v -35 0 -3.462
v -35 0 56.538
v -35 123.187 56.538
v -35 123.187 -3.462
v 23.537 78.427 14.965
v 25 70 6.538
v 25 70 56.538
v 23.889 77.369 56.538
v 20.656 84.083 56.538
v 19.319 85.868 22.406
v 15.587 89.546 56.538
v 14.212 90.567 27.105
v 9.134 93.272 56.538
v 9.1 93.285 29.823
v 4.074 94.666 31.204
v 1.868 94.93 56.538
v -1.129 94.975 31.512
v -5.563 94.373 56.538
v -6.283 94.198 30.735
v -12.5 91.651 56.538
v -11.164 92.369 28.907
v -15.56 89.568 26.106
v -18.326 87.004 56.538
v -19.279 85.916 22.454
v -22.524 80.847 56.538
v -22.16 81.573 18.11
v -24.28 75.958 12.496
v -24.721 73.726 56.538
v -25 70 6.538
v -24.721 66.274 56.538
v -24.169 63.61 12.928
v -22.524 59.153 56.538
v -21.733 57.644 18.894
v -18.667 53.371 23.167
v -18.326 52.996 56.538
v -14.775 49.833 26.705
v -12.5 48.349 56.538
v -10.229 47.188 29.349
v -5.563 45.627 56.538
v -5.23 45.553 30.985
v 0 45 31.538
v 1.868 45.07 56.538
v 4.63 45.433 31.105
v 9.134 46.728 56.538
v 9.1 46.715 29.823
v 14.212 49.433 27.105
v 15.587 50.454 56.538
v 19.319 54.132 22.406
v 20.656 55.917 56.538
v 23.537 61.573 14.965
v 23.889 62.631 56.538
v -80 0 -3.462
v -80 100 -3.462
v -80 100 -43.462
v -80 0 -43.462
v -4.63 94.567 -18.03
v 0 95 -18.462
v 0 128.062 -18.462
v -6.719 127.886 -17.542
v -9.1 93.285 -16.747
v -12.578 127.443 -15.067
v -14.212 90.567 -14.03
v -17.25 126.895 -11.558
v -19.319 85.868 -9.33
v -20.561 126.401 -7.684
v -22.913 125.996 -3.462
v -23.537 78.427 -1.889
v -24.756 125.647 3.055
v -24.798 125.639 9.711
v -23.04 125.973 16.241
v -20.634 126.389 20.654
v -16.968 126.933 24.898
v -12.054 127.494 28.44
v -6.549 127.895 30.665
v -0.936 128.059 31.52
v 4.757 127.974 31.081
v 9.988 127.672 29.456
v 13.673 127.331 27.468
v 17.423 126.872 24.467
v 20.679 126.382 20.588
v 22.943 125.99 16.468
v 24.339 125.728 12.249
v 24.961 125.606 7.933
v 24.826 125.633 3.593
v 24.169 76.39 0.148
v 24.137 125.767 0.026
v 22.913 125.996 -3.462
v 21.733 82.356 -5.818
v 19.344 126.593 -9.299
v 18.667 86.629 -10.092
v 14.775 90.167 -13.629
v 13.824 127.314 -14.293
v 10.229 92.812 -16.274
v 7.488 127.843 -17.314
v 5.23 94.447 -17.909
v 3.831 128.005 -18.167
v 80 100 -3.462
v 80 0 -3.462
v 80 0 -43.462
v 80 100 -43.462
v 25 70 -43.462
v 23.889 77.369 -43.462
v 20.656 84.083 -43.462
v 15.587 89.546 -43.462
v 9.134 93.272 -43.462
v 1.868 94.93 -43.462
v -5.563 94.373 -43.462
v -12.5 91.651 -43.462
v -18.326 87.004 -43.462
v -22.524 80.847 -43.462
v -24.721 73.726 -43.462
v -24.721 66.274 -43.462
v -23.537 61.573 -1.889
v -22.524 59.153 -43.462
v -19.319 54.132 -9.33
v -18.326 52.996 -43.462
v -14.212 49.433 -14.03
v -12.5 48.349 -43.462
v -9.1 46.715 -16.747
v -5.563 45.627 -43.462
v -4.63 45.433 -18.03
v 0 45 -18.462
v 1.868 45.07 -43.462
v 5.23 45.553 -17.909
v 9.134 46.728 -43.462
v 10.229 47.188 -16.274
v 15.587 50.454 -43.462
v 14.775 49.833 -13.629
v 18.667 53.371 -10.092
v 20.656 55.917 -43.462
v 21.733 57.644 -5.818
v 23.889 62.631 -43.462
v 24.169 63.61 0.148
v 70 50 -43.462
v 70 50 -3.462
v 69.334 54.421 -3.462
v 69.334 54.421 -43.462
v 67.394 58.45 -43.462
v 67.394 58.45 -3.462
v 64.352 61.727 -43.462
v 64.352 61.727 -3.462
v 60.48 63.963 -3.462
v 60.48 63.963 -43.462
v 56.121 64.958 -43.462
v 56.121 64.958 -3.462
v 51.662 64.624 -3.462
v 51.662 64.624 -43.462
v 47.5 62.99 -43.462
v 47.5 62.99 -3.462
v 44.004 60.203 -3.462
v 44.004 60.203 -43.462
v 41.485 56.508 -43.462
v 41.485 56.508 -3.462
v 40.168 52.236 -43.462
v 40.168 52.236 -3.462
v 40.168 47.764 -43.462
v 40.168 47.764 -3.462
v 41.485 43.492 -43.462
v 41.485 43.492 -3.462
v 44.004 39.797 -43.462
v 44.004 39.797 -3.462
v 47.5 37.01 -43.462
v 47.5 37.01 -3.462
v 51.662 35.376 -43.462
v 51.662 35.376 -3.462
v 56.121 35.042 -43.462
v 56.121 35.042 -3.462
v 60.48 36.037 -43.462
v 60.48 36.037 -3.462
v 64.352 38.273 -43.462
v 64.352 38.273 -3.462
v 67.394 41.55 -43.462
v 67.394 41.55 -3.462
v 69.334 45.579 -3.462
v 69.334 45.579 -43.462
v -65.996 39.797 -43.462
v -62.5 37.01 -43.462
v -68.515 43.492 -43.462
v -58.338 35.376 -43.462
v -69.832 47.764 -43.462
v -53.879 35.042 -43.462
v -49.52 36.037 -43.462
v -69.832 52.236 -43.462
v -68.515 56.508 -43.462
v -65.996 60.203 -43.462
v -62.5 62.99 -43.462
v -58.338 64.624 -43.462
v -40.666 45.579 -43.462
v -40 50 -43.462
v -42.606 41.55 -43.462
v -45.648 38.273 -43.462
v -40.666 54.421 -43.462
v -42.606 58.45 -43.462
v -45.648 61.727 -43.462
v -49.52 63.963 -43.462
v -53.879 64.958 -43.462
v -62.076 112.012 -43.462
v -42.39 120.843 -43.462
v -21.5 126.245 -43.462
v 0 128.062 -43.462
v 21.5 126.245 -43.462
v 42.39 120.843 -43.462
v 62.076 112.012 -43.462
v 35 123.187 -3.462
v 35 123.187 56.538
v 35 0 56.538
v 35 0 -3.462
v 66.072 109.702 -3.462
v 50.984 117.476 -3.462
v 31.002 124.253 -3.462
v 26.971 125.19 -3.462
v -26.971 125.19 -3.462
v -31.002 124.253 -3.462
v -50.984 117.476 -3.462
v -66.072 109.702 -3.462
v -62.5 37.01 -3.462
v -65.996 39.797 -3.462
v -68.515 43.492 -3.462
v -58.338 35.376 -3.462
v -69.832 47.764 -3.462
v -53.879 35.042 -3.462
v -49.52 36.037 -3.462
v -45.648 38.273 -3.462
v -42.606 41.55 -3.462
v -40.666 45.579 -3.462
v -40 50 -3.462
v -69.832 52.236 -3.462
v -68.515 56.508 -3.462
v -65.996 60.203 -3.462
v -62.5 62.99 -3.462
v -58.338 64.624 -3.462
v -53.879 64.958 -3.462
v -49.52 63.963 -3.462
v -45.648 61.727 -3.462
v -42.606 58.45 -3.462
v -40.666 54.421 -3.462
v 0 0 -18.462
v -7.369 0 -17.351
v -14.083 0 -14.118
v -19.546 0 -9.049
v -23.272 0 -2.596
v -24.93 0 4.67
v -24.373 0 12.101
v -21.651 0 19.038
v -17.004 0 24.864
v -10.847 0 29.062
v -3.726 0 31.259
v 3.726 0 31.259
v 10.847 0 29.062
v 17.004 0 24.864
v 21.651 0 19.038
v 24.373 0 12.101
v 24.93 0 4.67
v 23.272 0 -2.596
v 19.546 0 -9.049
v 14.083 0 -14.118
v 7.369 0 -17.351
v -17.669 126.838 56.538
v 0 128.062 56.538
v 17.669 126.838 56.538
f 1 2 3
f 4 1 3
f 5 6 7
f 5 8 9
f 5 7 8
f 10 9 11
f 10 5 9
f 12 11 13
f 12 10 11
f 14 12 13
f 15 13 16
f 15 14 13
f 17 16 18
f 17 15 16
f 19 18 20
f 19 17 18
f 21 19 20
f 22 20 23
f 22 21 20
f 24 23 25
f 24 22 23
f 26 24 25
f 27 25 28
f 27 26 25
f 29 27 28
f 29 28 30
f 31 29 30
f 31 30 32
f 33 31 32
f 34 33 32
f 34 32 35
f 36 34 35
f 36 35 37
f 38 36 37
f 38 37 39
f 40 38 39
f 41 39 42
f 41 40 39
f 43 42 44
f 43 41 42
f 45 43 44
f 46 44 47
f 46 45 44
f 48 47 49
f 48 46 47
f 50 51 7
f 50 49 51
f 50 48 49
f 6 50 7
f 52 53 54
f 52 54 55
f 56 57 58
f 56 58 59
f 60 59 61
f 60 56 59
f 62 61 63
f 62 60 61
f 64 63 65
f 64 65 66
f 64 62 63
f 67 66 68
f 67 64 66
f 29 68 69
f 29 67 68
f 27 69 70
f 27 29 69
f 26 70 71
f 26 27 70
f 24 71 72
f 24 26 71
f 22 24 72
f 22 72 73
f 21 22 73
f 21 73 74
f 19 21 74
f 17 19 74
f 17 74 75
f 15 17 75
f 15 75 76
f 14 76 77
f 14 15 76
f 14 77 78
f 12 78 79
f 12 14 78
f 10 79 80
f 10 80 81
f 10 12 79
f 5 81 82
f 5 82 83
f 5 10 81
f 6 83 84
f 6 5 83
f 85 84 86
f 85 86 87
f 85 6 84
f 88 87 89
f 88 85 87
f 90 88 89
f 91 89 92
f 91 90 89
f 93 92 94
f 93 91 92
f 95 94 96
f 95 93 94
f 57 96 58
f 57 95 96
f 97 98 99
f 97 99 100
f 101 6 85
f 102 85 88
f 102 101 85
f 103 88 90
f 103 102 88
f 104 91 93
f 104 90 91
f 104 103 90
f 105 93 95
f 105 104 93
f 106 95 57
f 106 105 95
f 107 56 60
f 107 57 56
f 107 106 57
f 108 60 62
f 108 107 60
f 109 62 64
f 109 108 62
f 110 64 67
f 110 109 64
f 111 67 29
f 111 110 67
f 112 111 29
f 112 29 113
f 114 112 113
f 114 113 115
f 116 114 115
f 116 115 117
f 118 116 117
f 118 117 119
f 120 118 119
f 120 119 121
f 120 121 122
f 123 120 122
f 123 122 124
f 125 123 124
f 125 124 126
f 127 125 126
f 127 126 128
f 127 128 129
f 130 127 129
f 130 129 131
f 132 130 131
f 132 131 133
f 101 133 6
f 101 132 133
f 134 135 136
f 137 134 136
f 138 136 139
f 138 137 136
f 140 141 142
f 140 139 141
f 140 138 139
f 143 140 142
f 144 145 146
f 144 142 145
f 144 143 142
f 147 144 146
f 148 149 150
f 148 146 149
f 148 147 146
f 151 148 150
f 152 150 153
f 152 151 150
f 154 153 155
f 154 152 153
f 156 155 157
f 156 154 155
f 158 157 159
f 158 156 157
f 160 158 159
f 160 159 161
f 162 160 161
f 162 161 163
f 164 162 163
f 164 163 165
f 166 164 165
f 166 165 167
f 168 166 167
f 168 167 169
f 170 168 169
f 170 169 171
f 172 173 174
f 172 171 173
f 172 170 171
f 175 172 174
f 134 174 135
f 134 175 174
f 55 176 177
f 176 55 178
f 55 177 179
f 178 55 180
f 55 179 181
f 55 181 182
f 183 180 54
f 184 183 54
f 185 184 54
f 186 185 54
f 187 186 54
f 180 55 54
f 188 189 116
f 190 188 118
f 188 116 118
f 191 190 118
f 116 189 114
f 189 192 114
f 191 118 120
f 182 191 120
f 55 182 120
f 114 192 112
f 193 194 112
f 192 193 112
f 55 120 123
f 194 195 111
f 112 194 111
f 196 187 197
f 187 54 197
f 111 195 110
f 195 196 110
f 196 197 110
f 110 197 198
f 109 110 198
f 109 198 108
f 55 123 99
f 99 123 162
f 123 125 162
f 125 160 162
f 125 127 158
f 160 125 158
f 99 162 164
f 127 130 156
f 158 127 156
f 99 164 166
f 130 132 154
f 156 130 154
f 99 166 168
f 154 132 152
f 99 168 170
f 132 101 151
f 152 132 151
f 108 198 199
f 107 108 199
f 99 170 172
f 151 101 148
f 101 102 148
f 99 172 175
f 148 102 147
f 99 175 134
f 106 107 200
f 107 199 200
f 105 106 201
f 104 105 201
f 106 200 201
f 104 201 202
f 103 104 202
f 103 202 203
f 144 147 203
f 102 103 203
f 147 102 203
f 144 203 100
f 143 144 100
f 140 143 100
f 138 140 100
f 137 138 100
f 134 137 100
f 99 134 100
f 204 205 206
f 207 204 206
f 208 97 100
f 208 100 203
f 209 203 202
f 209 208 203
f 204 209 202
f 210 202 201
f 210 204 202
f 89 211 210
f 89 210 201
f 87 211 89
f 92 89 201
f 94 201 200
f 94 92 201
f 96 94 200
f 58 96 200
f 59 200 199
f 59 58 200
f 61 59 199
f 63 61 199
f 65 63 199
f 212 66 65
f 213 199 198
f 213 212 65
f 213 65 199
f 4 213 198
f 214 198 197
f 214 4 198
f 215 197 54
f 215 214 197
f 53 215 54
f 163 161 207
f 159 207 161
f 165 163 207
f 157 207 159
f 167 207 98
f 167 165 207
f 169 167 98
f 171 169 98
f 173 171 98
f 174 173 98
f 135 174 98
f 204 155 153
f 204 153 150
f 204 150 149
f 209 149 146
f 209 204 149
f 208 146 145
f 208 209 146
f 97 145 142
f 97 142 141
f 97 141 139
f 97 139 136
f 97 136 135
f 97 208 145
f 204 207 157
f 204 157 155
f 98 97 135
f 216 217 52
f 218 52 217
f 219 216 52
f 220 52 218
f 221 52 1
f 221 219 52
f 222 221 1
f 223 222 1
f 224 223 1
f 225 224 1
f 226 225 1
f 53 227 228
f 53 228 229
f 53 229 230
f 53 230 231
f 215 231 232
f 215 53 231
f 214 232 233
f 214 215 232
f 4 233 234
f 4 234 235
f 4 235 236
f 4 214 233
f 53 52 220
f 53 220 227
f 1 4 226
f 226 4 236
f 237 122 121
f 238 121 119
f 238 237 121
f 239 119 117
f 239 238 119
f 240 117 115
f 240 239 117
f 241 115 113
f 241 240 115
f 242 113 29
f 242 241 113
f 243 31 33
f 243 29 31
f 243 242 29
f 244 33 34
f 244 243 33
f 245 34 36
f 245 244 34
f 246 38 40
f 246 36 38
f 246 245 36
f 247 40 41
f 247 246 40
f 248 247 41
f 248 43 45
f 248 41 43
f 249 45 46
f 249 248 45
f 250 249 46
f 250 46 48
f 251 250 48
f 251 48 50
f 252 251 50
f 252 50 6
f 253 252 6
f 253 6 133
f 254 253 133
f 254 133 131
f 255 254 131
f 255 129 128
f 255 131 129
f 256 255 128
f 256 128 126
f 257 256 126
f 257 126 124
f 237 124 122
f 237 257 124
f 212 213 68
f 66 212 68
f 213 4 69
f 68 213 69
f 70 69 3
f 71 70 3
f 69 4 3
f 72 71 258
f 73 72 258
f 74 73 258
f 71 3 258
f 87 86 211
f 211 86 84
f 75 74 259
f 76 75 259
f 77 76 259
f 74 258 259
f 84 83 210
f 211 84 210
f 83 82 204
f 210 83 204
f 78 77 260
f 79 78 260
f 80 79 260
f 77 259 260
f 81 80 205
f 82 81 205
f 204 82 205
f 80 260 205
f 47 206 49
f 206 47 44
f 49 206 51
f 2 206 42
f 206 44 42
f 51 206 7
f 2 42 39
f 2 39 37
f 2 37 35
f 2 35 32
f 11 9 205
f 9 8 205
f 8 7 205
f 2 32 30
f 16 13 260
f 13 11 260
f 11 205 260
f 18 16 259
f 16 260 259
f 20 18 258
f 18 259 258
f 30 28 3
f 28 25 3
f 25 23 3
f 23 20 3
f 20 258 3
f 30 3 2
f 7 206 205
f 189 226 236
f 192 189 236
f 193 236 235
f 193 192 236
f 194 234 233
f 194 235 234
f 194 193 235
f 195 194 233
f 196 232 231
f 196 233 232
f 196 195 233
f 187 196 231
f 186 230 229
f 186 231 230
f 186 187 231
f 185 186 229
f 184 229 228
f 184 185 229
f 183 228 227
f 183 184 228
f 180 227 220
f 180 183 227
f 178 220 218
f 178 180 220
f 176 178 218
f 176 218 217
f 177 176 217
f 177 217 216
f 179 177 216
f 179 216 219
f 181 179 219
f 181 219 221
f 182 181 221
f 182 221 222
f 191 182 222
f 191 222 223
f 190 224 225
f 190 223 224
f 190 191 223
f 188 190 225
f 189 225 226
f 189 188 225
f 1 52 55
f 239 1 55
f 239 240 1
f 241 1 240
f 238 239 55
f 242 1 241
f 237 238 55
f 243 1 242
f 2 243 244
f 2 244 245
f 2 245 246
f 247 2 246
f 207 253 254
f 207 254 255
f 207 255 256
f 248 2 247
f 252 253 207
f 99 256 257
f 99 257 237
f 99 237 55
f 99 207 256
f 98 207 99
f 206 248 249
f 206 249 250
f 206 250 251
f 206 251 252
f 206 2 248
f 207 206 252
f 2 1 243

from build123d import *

# Parameters (mm, degrees)
EXTRUDE_START            = -3.462177
EXTRUDE_1_DEPTH          = 40
EXTRUDE_START_2          = 60
EXTRUDE_2_DEPTH          = 60
CUT_EXTRUDE_1_REACH      = 163.234
CUT_EXTRUDE_1_END_RADIUS = 128.062484749
SKETCH_1_R               = 25
CUT_EXTRUDE_2_DEPTH      = 163.48076826
CUT_EXTRUDE_2_DEPTH_BACK = 163.48076826
SKETCH_5_R               = 25
SKETCH_5_R_2             = 15


with BuildPart() as part:
    # 草图2 → 凸台-拉伸1 (new body)
    with BuildSketch(Plane.XY.offset(EXTRUDE_START)):
        with BuildLine():
            Line((-80, 0), (80, 0))
            Line((80, 0), (80, 100))
            ThreePointArc((80, 100), (0, 128.062484749), (-80, 100))
            Line((-80, 100), (-80, 0))
        make_face()
    extrude(amount=-EXTRUDE_1_DEPTH)

    # 草图4 → 凸台-拉伸2 (add)
    with BuildSketch(Plane.XY.offset(-3.46217708).offset(EXTRUDE_START_2)):
        with BuildLine():
            Line((-35, 0), (-35, 123.186849948))
            ThreePointArc((-35, 123.186849948), (0, 128.062484749), (35, 123.186849948))
            Line((35, 123.186849948), (35, 0))
            Line((35, 0), (-35, 0))
        make_face()
    extrude(amount=-EXTRUDE_2_DEPTH)

    # 切除-拉伸1: up to this cylinder (the profile starts inside it)
    cut_extrude_1_end = Plane(origin=(0, 0, 6.537823), z_dir=(0, 0, 1)) * Cylinder(CUT_EXTRUDE_1_END_RADIUS, 583.592969497, mode=Mode.PRIVATE)
    # 草图1 → 切除-拉伸1 (cut, up to the surface)
    with BuildSketch(Plane(origin=(0, 0, 0), x_dir=(1, 0, 0), z_dir=(0, 1, 0)), mode=Mode.PRIVATE) as cut_extrude_1_sk1:
        with Locations(Location((0, -6.53782292, 0), (0, 0, 90))):
            Circle(SKETCH_1_R)
    cut_extrude_1_tool1 = extrude(cut_extrude_1_sk1.sketch, amount=CUT_EXTRUDE_1_REACH, mode=Mode.PRIVATE) & cut_extrude_1_end
    add(cut_extrude_1_tool1.solids().sort_by_distance((0, 0, 6.537823))[0], mode=Mode.SUBTRACT)

    # 草图5 → 切除-拉伸2 (cut, two sides: drawn at the far end of the back side and taken through both)
    with BuildSketch(Plane.XY.offset(-3.46217708).offset(-CUT_EXTRUDE_2_DEPTH_BACK)):
        with Locations((0, 70)):
            Circle(SKETCH_5_R)
        with Locations((-55, 50)):
            Circle(SKETCH_5_R_2)
        with Locations((55, 50)):
            Circle(SKETCH_5_R_2)
    extrude(amount=CUT_EXTRUDE_2_DEPTH + CUT_EXTRUDE_2_DEPTH_BACK, mode=Mode.SUBTRACT)


solid = part.part
